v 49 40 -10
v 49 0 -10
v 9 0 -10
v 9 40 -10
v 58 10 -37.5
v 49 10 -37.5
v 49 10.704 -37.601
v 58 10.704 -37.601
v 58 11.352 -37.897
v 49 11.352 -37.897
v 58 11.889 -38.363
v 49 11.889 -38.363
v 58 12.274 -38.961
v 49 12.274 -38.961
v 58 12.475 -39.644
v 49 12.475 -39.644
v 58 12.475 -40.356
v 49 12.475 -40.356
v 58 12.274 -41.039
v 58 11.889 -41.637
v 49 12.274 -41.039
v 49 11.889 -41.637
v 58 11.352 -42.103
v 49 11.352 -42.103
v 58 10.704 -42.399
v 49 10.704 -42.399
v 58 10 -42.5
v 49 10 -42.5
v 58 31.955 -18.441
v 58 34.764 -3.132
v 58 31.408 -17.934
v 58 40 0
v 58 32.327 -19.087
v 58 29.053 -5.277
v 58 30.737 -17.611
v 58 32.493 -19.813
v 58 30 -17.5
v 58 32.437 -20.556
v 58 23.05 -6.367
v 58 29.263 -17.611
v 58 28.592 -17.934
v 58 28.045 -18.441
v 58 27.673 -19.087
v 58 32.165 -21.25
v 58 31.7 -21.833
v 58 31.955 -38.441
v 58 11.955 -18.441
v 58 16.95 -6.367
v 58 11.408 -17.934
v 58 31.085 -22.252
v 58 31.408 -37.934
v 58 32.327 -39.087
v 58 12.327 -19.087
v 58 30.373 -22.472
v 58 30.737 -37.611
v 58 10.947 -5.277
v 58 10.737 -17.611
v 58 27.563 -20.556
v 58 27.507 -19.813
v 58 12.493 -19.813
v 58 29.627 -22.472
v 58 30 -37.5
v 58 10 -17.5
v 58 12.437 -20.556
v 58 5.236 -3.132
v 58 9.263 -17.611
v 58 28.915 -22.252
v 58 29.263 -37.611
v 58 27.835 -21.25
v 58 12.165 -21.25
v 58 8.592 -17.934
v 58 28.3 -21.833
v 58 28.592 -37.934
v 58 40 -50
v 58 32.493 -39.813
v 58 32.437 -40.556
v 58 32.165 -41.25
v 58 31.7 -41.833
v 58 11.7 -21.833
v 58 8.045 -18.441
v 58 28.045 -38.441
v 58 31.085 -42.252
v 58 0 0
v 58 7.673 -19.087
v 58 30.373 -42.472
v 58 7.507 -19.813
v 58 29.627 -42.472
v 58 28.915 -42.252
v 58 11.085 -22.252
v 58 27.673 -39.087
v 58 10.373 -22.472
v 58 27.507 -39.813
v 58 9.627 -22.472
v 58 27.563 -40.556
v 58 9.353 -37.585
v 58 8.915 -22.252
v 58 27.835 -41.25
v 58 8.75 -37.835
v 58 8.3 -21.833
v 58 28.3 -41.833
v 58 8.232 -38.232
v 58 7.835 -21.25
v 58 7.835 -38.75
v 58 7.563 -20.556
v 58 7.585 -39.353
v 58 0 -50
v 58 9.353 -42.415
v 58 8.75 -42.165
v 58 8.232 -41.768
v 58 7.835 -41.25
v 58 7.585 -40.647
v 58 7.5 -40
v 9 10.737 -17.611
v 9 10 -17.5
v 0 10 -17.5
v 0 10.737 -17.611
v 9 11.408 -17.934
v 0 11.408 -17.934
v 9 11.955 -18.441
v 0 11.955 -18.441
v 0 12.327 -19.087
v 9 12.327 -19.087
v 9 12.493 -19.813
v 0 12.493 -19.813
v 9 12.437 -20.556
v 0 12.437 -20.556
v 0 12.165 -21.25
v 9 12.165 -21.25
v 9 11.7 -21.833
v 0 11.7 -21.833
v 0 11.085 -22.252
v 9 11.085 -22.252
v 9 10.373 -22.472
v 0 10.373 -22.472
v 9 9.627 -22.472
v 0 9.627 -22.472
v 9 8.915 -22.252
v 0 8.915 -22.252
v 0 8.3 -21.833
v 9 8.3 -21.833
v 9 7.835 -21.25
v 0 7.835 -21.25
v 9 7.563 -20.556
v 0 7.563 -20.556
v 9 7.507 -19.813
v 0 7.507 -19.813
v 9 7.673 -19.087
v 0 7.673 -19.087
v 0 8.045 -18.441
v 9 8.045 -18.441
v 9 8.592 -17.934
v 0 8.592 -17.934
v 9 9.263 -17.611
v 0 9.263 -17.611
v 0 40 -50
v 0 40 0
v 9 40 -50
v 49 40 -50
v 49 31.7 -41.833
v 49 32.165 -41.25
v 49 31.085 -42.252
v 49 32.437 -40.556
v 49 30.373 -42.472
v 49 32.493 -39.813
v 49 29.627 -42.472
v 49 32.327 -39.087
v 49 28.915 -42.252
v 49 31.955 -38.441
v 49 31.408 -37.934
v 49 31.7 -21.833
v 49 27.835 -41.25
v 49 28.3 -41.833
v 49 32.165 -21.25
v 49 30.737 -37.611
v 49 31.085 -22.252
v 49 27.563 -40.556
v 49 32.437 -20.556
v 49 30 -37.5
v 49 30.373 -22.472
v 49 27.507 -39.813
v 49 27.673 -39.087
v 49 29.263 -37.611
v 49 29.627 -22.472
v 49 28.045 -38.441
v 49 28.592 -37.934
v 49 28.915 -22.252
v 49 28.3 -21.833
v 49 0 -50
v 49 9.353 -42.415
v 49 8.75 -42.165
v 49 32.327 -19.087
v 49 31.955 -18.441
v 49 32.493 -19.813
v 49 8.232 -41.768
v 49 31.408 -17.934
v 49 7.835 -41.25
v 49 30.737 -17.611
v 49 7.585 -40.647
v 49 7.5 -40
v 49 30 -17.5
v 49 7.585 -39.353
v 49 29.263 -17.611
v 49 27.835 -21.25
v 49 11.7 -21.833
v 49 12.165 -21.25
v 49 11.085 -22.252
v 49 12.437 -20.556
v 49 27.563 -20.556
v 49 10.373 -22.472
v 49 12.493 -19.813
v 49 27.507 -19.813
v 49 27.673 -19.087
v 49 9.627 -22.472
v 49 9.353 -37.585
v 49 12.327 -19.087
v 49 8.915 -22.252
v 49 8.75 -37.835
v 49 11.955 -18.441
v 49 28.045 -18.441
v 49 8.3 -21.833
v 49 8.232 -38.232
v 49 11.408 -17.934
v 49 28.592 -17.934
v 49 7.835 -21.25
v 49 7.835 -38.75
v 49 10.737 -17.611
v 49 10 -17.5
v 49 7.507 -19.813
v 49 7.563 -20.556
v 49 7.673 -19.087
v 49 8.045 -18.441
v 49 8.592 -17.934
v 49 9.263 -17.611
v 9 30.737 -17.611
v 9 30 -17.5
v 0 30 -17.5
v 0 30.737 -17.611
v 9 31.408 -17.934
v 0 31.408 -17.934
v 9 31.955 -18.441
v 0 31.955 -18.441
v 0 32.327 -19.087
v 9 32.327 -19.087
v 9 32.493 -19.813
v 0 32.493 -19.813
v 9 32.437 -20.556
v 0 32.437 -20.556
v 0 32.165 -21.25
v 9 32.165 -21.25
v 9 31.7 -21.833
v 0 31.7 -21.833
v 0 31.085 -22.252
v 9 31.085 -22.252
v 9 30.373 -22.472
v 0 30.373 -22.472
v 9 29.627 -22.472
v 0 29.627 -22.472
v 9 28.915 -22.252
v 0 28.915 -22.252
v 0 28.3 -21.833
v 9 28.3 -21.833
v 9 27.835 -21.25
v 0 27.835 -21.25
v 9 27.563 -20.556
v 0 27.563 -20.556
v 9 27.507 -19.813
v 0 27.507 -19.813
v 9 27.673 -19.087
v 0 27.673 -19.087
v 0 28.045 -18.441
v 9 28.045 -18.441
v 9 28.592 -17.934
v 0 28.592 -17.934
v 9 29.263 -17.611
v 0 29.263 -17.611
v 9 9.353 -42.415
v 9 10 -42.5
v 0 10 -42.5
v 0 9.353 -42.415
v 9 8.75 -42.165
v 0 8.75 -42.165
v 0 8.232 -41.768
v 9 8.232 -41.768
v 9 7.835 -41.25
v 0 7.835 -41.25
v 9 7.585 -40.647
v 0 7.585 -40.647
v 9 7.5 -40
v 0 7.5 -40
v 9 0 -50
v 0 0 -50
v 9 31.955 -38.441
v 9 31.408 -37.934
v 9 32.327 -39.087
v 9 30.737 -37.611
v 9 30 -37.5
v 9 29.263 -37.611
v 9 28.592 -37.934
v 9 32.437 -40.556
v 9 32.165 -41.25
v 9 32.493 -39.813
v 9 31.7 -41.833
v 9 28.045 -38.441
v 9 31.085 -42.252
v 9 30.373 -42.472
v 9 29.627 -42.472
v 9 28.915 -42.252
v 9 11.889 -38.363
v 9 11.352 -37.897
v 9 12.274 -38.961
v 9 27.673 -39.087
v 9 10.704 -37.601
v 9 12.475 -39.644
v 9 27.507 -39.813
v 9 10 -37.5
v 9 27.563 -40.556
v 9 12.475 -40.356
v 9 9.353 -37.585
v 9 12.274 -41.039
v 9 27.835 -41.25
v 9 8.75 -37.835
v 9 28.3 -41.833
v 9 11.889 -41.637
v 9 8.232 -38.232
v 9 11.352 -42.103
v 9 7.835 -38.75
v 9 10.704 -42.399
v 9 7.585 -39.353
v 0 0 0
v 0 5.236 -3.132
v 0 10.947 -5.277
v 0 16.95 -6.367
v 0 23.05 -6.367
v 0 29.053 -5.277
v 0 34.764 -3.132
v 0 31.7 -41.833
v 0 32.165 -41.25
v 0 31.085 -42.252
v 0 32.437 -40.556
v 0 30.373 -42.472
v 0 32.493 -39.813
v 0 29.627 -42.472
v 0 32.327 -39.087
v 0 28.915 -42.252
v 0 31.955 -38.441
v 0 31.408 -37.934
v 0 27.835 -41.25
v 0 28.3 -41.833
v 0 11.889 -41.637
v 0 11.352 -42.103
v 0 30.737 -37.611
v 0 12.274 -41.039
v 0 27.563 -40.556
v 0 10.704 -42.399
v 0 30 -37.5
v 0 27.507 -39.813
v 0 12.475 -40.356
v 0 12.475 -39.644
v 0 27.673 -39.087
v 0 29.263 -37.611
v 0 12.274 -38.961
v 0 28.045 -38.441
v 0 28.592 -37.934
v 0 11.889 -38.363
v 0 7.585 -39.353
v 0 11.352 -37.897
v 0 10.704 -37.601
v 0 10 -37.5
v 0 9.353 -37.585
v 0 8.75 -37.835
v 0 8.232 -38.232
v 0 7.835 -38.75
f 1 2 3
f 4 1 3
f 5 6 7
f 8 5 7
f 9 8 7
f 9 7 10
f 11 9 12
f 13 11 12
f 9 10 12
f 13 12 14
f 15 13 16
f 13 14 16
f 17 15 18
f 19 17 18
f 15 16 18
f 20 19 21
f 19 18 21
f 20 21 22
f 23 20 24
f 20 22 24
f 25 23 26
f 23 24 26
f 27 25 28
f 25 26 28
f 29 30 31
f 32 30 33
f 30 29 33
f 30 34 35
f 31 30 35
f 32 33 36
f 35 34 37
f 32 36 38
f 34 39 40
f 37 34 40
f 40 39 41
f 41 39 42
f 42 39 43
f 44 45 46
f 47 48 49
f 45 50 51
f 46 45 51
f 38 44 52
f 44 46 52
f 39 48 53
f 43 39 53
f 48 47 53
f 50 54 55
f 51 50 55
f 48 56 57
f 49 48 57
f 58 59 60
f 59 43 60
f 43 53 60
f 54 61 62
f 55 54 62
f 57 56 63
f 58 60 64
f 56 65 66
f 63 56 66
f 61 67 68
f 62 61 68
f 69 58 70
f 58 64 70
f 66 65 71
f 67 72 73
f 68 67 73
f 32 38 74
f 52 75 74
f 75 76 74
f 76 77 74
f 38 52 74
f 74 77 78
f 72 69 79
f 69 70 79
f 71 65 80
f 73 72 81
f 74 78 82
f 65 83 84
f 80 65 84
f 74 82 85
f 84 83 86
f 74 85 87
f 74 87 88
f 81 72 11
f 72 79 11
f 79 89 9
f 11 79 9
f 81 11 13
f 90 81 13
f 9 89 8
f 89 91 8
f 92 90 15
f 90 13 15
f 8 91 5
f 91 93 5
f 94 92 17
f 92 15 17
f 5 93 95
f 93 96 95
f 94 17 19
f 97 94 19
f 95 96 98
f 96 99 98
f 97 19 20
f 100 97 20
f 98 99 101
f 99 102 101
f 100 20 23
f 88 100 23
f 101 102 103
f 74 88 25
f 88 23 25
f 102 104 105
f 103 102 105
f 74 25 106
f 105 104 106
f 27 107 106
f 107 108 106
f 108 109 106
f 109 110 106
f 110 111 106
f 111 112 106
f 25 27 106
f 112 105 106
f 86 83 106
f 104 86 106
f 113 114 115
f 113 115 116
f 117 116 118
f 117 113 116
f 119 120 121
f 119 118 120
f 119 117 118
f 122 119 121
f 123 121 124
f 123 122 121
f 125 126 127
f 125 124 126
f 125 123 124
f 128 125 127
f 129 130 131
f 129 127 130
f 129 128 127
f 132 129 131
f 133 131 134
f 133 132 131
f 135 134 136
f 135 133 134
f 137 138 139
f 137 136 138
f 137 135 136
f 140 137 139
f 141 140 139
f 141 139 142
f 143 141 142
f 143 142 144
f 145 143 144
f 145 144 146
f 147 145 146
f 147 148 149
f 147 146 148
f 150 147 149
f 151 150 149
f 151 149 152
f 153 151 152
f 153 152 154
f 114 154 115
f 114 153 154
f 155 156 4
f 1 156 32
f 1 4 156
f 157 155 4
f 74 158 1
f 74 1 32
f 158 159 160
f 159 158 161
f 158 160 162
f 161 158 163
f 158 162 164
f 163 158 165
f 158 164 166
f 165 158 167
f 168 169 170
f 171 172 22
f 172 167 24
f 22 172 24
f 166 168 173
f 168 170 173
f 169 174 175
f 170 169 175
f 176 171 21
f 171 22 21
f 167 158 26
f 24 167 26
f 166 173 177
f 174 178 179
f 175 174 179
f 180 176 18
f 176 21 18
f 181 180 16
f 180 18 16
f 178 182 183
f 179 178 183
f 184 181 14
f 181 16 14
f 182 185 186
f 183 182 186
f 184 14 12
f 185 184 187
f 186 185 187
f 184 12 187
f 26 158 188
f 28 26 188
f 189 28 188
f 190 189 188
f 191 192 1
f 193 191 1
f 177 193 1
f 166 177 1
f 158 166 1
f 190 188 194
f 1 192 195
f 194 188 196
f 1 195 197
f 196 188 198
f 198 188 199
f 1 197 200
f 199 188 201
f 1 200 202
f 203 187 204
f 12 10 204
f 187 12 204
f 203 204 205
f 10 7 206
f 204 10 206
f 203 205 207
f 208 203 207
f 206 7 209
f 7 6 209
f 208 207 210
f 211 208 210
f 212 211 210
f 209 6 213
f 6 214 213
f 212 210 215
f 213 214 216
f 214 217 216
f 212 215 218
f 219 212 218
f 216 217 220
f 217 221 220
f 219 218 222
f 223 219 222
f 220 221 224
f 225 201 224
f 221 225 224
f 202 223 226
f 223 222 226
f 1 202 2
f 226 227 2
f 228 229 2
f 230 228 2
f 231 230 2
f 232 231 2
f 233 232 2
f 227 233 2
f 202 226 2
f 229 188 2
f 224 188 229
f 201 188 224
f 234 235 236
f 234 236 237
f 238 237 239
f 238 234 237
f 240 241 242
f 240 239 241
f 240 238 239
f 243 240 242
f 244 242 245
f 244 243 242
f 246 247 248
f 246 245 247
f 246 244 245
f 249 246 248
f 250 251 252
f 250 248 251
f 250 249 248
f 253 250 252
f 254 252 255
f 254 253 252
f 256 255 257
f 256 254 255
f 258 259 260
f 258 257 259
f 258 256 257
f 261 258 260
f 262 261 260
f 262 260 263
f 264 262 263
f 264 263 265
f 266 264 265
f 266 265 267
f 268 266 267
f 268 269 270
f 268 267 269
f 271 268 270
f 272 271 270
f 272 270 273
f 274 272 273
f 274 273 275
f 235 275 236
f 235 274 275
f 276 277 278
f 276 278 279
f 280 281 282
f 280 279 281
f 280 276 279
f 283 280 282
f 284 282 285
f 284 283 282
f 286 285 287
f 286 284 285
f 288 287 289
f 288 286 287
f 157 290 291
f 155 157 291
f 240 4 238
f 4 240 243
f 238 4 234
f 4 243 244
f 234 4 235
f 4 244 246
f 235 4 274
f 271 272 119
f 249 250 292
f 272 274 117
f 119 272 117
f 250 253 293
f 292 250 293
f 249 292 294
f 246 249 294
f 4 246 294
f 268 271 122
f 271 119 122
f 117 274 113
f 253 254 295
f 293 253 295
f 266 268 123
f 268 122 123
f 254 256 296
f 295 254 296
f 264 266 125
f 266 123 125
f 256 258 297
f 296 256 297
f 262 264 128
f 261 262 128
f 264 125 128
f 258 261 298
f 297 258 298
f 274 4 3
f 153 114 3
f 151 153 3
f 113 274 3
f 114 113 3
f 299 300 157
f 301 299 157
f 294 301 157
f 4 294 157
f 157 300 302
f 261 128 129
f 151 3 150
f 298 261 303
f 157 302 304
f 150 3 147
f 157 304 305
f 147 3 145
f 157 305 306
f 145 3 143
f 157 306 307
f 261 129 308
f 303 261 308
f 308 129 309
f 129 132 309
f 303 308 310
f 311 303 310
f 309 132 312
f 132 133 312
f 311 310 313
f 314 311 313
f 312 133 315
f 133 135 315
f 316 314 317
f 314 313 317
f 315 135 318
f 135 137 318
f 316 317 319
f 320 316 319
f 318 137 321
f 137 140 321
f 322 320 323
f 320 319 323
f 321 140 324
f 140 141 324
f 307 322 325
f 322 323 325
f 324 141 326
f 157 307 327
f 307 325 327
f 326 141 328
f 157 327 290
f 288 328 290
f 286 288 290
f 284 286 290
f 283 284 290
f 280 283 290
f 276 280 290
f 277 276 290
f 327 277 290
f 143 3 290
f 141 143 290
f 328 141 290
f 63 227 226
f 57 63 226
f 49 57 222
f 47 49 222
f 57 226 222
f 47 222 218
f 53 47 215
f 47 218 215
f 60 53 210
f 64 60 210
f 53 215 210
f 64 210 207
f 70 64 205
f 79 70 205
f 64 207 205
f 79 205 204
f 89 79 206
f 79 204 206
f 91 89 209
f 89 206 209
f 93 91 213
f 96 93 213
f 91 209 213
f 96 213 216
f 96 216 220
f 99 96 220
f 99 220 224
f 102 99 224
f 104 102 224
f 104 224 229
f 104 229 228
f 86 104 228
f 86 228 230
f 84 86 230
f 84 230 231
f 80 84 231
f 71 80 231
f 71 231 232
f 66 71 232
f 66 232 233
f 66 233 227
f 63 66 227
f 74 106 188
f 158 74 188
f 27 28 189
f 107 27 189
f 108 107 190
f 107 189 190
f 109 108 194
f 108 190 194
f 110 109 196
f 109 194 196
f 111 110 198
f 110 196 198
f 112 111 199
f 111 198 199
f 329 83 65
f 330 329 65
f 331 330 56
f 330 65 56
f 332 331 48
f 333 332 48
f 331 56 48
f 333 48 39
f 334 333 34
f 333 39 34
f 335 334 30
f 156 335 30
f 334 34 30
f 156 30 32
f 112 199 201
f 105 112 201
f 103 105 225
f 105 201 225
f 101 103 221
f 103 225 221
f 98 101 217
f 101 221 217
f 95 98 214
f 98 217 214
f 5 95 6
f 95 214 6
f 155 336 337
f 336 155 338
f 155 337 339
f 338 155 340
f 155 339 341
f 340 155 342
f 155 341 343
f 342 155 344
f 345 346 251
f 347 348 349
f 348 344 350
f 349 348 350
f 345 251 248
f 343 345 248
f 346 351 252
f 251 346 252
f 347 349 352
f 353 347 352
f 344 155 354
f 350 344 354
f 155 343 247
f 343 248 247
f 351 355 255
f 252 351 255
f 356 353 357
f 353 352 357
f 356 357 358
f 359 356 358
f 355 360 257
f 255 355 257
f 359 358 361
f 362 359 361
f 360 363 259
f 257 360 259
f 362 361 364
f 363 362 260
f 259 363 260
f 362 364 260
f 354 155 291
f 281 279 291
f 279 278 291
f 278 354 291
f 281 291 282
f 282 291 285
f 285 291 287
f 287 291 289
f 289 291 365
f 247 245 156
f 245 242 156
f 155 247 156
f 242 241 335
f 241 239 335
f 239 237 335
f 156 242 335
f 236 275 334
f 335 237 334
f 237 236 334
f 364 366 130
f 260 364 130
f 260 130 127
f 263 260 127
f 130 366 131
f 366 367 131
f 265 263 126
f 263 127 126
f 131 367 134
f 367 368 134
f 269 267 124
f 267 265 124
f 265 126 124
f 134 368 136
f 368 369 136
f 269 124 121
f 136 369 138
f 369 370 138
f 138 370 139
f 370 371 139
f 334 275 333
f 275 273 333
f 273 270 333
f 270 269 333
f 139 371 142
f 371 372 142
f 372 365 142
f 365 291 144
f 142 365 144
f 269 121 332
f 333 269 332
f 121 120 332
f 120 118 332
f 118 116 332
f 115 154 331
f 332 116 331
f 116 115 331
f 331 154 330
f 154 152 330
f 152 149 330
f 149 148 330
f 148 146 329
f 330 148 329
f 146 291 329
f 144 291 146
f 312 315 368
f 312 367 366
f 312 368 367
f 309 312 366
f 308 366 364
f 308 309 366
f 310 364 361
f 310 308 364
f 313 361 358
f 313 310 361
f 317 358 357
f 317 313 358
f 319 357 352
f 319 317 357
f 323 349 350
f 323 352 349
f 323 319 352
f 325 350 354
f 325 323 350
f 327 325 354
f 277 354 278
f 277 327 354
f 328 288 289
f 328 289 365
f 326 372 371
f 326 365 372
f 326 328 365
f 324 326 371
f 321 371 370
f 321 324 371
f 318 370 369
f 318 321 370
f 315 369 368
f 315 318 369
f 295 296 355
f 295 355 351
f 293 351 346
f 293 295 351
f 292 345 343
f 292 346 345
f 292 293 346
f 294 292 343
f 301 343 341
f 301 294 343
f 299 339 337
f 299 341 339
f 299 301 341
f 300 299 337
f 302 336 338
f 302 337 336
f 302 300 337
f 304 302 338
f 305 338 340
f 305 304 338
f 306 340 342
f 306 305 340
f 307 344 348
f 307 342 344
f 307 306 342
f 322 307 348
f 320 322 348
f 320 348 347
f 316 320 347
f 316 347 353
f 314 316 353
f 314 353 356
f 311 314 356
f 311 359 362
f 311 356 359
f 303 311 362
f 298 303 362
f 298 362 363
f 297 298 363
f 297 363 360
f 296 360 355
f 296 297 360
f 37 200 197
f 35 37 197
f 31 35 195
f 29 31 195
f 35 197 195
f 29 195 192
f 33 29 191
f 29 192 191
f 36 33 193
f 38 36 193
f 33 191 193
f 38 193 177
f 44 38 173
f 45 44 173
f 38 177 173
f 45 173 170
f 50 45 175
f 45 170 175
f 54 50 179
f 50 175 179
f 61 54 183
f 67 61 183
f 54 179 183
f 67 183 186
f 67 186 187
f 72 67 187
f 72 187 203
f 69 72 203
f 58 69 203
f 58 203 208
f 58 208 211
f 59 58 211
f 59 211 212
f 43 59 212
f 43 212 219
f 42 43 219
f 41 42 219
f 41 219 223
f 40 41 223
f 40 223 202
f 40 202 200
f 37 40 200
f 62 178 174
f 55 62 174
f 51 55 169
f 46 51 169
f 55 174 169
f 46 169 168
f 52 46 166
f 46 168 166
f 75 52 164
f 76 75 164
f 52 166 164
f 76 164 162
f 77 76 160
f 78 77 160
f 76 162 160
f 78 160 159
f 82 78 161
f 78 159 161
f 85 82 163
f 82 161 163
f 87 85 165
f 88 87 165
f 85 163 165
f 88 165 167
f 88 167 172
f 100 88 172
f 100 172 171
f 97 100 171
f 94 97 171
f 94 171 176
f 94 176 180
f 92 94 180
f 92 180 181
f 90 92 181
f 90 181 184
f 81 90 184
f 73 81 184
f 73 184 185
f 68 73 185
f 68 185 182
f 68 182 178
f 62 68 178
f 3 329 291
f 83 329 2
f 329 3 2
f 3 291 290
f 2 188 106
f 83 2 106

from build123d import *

# Parameters (mm, degrees)
BOSS_EXTRUDE1_DEPTH     = 40
SKETCH4_R               = 2.5
CUT_EXTRUDE1_DEPTH      = 50
CUT_EXTRUDE1_DEPTH_BACK = 10
CUT_EXTRUDE2_DEPTH      = 59


with BuildPart() as part:
    # Sketch1 → Boss-Extrude1 (new body)
    with BuildSketch(Plane(origin=(0, 0, 0), x_dir=(1, 0, 0), z_dir=(0, 1, 0))):
        Polygon((0, 0), (58, 0), (58, 50), (49, 50), (49, 10), (9, 10), (9, 50), (0, 50), align=None)
    extrude(amount=BOSS_EXTRUDE1_DEPTH)

    # Sketch4 → Cut-Extrude1 (cut, two sides)
    with BuildSketch(Plane.ZY.offset(-49)) as cut_extrude1_sk:
        with BuildLine():
            ThreePointArc((-42.5, 10), (-41.767766953, 8.232233047), (-40, 7.5))
            Line((-40, 7.5), (-40, 10))
            Line((-40, 10), (-42.5, 10))
        make_face()
        with BuildLine():
            Line((-40, 10), (-40, 7.5))
            ThreePointArc((-40, 7.5), (-38.232233047, 8.232233047), (-37.5, 10))
            ThreePointArc((-37.5, 10), (-40, 12.5), (-42.5, 10))
            Line((-42.5, 10), (-40, 10))
        make_face()
        with Locations((-20, 10)):
            Circle(SKETCH4_R)
        with Locations((-40, 30)):
            Circle(SKETCH4_R)
        with Locations((-20, 30)):
            Circle(SKETCH4_R)
    extrude(amount=CUT_EXTRUDE1_DEPTH, mode=Mode.SUBTRACT)
    extrude(cut_extrude1_sk.sketch, amount=-CUT_EXTRUDE1_DEPTH_BACK, mode=Mode.SUBTRACT)

    # Sketch5 → Cut-Extrude2 (cut, through all)
    with BuildSketch(Plane(origin=(58, 0, 0), x_dir=(0, 0, -1), z_dir=(1, 0, 0))):
        with BuildLine():
            Line((0, 40), (0, 0))
            ThreePointArc((0, 0), (6.50454583, 20), (0, 40))
        make_face()
    extrude(amount=-CUT_EXTRUDE2_DEPTH, mode=Mode.SUBTRACT)


solid = part.part
